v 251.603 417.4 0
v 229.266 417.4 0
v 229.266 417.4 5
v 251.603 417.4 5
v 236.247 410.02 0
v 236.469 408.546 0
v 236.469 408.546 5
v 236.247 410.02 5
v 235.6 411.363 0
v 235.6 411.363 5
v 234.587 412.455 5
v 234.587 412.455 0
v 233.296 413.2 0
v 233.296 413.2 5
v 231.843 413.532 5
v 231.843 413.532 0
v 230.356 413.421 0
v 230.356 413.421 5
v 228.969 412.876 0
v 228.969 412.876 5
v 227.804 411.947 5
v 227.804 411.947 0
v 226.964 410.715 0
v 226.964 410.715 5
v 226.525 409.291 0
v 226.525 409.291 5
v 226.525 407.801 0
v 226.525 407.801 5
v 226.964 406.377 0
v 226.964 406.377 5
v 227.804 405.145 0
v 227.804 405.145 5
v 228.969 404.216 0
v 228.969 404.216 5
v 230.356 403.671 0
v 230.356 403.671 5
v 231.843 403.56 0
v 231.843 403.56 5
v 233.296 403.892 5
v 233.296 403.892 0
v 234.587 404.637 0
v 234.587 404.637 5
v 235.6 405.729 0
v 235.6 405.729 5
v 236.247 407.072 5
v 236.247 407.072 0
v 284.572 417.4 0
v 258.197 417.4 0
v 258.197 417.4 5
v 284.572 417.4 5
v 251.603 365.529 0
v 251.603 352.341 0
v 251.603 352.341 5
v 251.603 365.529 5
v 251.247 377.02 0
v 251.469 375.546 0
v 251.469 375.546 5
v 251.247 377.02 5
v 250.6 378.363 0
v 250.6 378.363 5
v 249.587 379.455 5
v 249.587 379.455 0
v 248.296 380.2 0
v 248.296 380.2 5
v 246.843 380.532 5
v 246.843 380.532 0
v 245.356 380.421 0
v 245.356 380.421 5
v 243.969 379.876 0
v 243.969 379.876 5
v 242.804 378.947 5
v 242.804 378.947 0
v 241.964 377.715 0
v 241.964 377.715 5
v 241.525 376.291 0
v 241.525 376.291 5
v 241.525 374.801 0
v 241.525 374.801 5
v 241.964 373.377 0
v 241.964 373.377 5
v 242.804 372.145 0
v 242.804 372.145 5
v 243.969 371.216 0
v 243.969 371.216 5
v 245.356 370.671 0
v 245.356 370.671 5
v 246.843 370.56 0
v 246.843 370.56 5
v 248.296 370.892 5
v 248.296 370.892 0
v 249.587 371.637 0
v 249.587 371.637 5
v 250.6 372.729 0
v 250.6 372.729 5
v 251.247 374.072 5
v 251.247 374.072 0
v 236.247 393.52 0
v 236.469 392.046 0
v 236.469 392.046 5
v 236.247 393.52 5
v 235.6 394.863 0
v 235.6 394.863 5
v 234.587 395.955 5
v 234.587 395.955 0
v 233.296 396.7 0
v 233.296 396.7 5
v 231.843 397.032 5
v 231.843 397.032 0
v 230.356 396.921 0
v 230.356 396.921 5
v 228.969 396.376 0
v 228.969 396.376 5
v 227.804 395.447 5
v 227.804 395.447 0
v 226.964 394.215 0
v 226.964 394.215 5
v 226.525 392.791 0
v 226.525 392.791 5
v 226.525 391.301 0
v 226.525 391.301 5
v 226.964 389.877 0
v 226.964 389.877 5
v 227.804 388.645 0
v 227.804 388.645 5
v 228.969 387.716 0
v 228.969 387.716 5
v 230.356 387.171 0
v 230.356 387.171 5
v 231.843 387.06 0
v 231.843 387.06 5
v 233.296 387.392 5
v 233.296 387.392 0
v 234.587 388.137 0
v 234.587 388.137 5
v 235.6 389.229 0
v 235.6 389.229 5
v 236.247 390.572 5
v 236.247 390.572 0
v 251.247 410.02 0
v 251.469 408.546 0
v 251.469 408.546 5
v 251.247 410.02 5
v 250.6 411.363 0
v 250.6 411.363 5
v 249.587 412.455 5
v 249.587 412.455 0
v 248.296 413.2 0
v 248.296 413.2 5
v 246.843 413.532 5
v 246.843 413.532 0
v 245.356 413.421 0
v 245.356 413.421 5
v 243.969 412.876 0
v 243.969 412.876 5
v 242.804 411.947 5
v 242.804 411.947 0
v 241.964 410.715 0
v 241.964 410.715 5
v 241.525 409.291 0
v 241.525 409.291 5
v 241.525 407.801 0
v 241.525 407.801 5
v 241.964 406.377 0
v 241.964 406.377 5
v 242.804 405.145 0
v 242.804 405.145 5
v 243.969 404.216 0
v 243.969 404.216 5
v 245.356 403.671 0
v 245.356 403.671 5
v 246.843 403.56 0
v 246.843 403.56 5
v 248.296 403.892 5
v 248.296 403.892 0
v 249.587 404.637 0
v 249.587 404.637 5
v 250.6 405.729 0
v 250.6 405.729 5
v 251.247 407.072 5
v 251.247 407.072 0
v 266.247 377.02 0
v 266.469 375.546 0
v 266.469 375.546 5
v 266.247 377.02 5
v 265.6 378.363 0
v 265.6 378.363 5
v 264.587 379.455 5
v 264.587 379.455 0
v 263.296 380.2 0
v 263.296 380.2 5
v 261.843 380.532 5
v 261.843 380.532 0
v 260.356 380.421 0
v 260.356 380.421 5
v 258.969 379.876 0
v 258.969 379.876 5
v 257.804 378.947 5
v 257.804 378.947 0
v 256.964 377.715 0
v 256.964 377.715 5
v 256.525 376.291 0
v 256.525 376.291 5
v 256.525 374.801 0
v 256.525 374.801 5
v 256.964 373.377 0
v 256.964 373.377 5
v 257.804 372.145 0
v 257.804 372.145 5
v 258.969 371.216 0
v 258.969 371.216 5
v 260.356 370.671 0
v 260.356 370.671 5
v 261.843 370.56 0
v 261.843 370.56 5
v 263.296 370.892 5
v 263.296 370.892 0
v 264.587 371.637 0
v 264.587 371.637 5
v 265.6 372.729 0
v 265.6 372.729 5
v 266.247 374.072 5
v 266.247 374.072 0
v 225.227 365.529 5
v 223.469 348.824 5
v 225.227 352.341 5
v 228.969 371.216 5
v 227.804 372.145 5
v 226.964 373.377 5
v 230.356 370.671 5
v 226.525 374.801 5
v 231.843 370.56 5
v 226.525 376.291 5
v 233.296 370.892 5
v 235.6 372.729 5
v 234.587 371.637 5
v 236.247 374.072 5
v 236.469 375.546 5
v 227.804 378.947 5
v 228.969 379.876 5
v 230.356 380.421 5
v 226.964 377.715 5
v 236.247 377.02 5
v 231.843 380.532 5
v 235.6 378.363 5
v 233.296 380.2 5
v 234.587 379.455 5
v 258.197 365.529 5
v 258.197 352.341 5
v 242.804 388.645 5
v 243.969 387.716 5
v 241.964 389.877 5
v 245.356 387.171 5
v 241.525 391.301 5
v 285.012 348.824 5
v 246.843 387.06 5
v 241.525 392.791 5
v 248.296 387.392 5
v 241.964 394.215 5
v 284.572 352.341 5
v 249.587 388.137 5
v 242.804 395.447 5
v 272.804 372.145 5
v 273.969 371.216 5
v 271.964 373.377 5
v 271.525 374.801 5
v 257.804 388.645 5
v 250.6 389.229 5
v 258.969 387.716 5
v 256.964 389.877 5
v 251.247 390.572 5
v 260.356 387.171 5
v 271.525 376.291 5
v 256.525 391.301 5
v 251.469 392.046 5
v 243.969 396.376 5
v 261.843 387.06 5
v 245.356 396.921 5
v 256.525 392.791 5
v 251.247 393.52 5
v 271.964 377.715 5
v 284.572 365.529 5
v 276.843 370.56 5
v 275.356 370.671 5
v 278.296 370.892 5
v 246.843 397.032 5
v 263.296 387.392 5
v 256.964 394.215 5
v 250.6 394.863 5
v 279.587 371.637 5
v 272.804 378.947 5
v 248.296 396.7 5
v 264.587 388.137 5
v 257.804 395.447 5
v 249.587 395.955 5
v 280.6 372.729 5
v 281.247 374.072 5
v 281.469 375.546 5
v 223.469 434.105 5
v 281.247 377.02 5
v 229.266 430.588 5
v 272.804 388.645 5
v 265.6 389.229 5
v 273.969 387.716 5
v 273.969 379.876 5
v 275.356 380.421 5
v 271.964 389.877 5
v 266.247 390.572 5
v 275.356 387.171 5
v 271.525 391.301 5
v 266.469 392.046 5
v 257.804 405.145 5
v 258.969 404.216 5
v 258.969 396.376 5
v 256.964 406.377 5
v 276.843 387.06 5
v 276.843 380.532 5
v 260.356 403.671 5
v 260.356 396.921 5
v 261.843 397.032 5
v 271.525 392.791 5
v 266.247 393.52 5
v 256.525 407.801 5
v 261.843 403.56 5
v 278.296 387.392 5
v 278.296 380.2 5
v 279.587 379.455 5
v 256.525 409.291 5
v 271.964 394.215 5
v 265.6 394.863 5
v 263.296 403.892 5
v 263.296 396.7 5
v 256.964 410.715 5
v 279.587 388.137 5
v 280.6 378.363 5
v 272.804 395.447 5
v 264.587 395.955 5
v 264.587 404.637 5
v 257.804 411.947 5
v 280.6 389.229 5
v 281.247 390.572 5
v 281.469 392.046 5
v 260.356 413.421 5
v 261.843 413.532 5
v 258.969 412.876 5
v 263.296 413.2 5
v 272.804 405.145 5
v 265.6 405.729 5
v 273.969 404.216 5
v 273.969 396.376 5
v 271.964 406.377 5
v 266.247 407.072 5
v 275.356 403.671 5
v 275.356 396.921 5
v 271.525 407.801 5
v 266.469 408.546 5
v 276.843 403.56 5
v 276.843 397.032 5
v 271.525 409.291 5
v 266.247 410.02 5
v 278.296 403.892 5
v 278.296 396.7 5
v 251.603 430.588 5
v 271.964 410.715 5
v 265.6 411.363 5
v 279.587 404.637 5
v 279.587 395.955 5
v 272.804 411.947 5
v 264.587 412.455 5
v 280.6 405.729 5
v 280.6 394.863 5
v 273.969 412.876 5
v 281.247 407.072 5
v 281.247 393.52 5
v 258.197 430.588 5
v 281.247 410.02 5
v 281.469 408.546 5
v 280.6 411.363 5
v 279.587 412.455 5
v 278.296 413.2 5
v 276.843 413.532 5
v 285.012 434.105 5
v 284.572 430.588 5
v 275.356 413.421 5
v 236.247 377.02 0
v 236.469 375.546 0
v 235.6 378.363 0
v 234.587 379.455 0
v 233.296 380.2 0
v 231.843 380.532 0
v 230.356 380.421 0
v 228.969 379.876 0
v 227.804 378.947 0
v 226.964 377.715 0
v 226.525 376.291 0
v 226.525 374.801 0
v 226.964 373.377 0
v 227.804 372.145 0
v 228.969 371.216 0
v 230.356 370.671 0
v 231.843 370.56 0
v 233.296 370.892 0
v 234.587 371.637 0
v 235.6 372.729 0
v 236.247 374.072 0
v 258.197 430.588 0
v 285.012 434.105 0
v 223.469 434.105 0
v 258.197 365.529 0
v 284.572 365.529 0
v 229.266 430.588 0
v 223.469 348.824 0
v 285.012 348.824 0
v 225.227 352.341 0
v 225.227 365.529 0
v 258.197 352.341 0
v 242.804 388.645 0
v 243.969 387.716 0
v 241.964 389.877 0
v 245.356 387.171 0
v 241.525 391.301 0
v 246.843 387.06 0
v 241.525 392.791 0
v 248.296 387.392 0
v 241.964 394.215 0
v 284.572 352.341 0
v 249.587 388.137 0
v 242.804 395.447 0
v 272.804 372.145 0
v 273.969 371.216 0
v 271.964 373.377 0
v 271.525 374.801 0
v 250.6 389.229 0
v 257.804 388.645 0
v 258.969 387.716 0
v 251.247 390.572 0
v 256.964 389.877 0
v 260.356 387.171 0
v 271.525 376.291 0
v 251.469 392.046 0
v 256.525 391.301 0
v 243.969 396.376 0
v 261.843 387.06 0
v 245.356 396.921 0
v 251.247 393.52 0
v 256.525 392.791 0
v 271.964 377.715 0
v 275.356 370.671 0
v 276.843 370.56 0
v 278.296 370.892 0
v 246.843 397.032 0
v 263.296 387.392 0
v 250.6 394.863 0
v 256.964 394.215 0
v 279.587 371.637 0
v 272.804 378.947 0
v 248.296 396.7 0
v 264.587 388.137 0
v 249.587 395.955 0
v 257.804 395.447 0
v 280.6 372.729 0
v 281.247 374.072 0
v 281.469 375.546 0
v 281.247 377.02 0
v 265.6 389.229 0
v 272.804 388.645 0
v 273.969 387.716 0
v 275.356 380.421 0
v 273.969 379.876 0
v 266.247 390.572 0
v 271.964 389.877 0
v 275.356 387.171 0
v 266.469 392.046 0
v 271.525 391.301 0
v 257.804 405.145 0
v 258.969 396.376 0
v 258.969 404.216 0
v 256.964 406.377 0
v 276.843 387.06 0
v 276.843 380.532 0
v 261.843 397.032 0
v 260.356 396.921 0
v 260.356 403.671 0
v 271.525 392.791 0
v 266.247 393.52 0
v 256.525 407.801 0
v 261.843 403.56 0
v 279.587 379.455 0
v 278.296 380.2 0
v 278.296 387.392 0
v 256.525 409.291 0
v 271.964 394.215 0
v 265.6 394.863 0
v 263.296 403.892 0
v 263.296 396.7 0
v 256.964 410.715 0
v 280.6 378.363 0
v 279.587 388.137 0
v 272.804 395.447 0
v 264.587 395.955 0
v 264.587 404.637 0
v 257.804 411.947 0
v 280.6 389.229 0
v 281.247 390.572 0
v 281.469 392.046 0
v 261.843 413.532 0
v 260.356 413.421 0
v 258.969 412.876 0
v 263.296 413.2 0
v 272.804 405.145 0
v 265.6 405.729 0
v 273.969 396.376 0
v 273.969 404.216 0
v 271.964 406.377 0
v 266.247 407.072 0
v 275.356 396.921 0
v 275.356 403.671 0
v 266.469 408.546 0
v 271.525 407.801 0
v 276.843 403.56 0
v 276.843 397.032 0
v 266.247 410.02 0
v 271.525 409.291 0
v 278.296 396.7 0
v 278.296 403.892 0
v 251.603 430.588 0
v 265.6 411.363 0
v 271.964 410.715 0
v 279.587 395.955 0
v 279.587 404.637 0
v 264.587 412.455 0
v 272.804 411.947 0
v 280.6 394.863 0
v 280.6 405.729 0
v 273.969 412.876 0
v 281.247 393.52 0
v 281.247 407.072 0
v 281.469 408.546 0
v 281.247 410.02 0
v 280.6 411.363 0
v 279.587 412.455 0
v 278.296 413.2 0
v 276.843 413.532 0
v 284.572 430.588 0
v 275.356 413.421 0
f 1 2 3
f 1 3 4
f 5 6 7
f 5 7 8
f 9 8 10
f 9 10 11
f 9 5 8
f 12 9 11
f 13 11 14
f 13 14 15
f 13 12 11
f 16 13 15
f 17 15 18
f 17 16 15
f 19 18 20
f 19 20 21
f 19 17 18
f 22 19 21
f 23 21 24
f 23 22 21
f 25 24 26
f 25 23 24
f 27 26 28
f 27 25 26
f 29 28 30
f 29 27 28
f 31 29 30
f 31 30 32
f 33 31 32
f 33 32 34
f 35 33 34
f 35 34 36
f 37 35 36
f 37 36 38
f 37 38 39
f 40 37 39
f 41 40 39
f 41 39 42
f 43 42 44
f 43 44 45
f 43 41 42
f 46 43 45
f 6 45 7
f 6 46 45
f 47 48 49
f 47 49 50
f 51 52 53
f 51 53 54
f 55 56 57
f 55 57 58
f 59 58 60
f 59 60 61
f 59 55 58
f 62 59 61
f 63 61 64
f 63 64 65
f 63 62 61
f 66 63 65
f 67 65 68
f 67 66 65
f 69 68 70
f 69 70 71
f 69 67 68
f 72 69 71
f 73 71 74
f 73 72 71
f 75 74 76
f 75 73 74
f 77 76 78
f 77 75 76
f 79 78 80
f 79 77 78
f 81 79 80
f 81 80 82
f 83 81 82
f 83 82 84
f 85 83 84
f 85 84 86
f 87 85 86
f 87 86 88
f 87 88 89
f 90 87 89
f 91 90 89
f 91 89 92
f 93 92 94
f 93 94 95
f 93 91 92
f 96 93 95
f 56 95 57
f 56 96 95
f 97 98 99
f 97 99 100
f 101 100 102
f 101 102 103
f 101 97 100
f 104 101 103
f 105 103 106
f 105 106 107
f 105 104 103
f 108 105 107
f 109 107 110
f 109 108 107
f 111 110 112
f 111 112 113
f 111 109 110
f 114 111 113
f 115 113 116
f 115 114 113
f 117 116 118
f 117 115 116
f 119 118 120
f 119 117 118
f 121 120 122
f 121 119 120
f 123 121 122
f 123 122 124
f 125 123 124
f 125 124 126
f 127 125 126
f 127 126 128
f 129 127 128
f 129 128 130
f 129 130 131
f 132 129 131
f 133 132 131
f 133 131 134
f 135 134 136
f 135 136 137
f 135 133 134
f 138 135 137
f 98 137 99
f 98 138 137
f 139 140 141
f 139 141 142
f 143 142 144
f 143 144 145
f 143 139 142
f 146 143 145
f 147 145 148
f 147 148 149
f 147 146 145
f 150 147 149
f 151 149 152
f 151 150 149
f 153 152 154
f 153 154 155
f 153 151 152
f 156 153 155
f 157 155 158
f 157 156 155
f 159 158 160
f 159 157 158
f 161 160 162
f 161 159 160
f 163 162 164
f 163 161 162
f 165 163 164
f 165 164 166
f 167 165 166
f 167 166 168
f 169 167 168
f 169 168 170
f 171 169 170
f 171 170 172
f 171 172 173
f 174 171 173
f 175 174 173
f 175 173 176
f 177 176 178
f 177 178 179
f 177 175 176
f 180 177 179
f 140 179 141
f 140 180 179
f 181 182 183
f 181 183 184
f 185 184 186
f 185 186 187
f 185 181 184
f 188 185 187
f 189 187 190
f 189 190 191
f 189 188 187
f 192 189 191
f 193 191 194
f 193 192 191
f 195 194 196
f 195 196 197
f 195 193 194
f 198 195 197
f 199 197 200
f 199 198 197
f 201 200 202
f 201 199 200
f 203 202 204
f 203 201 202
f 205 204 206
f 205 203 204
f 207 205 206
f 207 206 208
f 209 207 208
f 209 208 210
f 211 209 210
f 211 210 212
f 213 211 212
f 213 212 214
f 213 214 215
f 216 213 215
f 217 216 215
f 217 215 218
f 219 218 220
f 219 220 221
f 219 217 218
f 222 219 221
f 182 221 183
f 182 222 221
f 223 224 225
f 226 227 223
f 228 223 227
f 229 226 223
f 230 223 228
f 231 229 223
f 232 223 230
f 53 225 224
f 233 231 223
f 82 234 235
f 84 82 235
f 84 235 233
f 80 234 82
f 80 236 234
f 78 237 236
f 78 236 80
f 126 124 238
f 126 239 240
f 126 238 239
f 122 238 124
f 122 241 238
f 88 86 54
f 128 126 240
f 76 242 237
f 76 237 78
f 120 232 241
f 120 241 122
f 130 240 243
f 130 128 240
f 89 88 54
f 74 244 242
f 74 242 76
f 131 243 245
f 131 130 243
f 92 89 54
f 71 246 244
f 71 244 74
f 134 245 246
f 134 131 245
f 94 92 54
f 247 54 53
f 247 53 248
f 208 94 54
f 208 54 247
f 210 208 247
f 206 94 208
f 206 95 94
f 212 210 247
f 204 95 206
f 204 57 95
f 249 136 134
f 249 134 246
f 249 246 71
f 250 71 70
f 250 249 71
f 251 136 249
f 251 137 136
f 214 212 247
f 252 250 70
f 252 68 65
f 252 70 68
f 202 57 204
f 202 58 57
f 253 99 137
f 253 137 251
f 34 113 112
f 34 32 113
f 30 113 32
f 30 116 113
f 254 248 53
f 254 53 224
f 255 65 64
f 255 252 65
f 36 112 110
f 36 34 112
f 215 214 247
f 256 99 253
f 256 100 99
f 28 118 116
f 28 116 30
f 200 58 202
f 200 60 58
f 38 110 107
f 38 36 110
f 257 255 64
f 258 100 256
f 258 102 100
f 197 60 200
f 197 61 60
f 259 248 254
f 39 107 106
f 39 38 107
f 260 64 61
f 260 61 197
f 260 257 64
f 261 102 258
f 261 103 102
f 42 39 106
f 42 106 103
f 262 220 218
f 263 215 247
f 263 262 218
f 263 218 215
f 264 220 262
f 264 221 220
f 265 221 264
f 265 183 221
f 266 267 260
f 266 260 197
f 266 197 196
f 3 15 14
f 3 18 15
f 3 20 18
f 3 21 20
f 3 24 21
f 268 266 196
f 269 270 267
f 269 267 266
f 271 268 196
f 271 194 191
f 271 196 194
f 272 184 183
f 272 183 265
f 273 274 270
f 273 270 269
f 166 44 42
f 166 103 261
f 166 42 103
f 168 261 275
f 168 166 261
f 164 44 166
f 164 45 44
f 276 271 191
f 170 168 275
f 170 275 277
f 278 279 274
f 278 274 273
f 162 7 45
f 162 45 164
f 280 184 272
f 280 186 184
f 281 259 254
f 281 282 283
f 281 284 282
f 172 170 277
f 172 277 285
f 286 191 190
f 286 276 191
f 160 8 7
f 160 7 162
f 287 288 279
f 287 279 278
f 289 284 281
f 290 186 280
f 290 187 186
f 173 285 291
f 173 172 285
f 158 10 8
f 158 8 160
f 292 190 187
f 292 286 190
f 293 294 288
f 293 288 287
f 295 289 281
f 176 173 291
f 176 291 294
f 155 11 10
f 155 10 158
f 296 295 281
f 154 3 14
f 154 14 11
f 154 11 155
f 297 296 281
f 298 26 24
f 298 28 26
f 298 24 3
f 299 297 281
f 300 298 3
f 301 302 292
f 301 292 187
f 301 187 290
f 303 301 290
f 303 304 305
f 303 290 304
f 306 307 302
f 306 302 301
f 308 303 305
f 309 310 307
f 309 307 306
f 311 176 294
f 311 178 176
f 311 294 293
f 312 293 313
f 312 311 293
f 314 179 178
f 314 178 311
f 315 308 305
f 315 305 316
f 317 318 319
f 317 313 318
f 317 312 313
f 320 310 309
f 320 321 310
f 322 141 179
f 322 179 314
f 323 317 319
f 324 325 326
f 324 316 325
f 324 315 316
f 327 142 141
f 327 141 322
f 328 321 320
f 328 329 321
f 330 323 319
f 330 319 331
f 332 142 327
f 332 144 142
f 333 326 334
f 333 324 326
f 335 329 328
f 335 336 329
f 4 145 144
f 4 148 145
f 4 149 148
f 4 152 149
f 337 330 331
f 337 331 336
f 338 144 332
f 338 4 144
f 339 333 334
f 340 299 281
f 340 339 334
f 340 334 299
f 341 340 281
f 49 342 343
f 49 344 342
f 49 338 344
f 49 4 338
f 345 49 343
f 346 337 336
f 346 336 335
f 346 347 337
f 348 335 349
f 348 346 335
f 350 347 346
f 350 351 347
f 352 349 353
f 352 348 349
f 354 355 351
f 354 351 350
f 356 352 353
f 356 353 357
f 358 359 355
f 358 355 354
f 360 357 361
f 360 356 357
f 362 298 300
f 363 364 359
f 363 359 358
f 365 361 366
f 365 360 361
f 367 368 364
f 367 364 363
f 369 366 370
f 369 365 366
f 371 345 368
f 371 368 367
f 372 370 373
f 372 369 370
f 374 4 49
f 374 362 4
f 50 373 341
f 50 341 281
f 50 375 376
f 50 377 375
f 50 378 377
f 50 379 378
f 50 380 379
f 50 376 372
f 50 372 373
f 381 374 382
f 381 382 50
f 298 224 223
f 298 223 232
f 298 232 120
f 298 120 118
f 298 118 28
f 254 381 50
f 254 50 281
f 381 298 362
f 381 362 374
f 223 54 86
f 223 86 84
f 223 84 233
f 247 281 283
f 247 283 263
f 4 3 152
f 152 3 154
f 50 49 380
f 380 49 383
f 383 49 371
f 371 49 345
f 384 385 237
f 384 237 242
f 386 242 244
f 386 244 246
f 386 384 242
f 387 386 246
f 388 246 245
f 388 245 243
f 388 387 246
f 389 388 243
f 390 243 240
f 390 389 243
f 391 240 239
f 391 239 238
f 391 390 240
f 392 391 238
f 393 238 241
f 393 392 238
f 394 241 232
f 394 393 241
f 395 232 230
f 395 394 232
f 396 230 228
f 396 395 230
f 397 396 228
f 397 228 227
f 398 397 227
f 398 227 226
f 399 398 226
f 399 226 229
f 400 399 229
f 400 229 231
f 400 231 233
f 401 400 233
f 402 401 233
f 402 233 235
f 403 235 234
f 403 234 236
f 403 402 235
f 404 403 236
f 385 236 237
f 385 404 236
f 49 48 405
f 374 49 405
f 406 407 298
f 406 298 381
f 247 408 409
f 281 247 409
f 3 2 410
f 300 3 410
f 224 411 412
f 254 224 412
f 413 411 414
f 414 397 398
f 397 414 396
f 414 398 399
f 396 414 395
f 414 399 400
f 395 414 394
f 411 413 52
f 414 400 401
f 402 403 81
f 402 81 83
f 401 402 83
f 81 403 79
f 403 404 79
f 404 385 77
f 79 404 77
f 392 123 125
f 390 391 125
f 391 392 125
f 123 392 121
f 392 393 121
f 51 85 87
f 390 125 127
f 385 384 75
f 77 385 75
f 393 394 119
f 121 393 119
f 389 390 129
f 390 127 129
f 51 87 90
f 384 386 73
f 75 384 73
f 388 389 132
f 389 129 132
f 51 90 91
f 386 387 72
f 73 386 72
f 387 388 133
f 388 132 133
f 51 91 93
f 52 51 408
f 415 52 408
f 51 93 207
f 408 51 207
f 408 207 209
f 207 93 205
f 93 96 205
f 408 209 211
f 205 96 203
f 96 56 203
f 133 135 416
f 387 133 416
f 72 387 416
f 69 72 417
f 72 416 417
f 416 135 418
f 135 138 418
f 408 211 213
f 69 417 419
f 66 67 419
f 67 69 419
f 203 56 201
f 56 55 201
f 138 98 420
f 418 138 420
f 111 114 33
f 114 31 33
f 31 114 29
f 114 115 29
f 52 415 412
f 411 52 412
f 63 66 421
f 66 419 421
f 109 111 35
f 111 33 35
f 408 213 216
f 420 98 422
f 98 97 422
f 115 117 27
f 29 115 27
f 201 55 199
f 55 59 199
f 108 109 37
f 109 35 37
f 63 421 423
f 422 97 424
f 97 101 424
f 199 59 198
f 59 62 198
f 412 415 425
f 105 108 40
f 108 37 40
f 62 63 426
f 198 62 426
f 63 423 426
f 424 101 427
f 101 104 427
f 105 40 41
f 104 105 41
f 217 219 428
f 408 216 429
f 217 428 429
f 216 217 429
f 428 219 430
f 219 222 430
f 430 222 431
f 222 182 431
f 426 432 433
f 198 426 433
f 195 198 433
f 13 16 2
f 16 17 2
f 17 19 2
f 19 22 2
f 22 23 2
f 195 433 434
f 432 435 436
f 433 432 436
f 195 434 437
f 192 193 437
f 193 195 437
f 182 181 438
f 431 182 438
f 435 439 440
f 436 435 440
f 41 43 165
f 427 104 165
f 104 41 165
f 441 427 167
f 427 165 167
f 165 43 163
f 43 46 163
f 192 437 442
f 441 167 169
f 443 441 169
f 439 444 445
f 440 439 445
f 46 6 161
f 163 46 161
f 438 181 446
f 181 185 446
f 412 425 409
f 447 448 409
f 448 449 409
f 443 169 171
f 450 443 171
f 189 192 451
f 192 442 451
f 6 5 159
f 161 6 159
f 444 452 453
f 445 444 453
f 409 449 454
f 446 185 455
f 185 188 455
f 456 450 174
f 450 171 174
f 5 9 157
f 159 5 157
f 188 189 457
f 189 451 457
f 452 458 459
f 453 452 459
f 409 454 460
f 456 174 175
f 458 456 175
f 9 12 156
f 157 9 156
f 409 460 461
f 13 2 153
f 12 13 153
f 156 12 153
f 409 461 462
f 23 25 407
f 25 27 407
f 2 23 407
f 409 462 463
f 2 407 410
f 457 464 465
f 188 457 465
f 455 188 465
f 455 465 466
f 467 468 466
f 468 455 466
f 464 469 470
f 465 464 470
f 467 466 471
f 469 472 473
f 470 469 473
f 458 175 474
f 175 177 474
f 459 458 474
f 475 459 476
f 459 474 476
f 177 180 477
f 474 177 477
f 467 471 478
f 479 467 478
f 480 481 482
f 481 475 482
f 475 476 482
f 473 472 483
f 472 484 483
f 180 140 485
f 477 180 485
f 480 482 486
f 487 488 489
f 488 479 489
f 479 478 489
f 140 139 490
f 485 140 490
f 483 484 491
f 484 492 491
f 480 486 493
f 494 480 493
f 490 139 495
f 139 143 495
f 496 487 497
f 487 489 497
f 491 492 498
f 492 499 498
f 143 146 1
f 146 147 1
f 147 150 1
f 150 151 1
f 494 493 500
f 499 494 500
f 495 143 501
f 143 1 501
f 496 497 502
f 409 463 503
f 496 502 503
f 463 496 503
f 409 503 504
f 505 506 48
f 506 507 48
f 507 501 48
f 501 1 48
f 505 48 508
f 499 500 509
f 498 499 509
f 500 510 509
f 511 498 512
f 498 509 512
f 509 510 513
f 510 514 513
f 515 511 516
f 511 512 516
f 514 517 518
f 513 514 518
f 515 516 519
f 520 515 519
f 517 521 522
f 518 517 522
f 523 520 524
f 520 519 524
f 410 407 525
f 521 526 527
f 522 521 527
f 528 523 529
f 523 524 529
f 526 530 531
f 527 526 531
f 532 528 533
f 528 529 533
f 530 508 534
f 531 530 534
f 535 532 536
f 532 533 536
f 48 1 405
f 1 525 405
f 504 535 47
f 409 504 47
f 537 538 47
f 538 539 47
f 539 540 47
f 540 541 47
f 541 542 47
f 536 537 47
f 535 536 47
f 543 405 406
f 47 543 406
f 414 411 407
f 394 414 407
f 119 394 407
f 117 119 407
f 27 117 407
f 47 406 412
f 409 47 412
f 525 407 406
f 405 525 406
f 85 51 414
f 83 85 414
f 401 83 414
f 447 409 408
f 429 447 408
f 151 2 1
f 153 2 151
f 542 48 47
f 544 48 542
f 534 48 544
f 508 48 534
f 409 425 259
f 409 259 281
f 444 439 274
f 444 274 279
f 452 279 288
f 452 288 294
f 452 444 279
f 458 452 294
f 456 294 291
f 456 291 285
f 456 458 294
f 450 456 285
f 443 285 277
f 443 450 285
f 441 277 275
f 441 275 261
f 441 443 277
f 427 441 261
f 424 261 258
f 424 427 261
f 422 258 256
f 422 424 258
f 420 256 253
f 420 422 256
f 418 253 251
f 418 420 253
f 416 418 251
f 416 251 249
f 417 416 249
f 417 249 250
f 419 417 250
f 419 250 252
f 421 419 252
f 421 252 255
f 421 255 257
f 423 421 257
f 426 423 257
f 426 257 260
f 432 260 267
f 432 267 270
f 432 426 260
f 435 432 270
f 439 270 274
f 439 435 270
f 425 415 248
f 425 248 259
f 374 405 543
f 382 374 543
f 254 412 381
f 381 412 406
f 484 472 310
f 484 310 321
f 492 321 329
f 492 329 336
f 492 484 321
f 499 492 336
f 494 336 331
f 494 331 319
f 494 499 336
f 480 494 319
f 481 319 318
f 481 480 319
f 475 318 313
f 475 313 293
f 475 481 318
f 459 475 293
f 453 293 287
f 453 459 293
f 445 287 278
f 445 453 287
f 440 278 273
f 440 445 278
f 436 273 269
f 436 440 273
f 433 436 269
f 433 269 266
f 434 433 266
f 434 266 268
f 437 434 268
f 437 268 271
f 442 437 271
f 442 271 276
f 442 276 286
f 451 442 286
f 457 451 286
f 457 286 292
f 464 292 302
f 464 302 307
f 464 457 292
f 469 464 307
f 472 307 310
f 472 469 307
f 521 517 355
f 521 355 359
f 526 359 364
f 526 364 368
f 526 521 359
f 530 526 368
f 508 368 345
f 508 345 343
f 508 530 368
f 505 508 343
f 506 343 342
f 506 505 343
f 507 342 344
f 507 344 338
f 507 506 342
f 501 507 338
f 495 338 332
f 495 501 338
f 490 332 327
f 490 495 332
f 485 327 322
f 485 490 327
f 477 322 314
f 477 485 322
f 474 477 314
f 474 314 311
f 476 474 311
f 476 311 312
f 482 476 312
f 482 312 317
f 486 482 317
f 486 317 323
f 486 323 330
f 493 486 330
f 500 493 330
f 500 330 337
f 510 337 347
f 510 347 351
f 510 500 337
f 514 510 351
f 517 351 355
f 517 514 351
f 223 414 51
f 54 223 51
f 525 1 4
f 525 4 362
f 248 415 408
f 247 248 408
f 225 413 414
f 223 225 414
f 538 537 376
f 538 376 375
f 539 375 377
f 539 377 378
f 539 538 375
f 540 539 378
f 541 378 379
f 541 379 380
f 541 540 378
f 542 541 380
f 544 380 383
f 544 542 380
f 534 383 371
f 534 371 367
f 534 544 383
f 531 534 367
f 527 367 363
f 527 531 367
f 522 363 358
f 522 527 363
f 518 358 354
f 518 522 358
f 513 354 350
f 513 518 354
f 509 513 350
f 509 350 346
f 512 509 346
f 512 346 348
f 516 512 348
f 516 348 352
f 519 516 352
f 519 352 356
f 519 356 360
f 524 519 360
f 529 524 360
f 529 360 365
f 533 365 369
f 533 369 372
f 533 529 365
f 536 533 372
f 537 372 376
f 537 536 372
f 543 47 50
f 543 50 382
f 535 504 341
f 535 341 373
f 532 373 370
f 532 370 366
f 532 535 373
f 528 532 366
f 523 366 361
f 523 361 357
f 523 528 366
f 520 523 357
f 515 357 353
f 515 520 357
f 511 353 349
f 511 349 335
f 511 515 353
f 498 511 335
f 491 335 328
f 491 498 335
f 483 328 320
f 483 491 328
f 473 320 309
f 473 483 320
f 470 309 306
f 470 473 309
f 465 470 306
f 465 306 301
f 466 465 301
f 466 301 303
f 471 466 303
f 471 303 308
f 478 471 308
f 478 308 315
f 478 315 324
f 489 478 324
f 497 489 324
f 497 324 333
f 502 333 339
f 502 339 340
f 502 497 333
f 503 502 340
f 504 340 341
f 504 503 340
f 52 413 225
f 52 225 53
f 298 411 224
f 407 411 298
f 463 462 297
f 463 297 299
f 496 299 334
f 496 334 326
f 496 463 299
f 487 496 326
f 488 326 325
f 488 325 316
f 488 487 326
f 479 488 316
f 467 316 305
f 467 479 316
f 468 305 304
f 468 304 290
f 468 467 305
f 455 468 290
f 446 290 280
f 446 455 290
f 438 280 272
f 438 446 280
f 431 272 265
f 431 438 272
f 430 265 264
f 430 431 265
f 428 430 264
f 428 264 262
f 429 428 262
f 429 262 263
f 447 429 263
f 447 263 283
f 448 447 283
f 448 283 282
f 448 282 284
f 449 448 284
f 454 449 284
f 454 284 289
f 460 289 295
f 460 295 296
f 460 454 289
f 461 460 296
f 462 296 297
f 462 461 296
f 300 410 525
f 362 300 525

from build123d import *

# Parameters (mm, degrees)
SKETCH1_W           = 61.542579433
SKETCH1_H           = 85.2804315
SKETCH1_R           = 5
SKETCH1_W_2         = 22.337231555
SKETCH1_H_2         = 13.187695593
SKETCH1_W_3         = 26.375391186
BOSS_EXTRUDE1_DEPTH = 5


with BuildPart() as part:
    # Sketch1 → Boss-Extrude1 (new body)
    with BuildSketch(Plane.XY):
        with Locations((254.240343952, 391.464524612)):
            Rectangle(SKETCH1_W, SKETCH1_H)
        with Locations((231.469054236, 408.546029818)):
            Circle(SKETCH1_R, mode=Mode.SUBTRACT)
        with Locations((246.469054236, 408.546029818)):
            Circle(SKETCH1_R, mode=Mode.SUBTRACT)
        with Locations((261.469054236, 408.546029818)):
            Circle(SKETCH1_R, mode=Mode.SUBTRACT)
        with Locations((276.469054236, 408.546029818)):
            Circle(SKETCH1_R, mode=Mode.SUBTRACT)
        with Locations((231.469054236, 392.046029818)):
            Circle(SKETCH1_R, mode=Mode.SUBTRACT)
        with Locations((246.469054236, 392.046029818)):
            Circle(SKETCH1_R, mode=Mode.SUBTRACT)
        with Locations((261.469054236, 392.046029818)):
            Circle(SKETCH1_R, mode=Mode.SUBTRACT)
        with Locations((276.469054236, 392.046029818)):
            Circle(SKETCH1_R, mode=Mode.SUBTRACT)
        with Locations((231.469054236, 375.546029818)):
            Circle(SKETCH1_R, mode=Mode.SUBTRACT)
        with Locations((246.469054236, 375.546029818)):
            Circle(SKETCH1_R, mode=Mode.SUBTRACT)
        with Locations((261.469054236, 375.546029818)):
            Circle(SKETCH1_R, mode=Mode.SUBTRACT)
        with Locations((276.469054236, 375.546029818)):
            Circle(SKETCH1_R, mode=Mode.SUBTRACT)
        with Locations((240.434189057, 423.994173741)):
            Rectangle(SKETCH1_W_2, SKETCH1_H_2, mode=Mode.SUBTRACT)
        with Locations((271.384348223, 423.994173741)):
            Rectangle(SKETCH1_W_3, SKETCH1_H_2, mode=Mode.SUBTRACT)
        with Locations((238.415109241, 358.934875483)):
            Rectangle(SKETCH1_W_3, SKETCH1_H_2, mode=Mode.SUBTRACT)
        with Locations((271.384348223, 358.934875483)):
            Rectangle(SKETCH1_W_3, SKETCH1_H_2, mode=Mode.SUBTRACT)
    extrude(amount=BOSS_EXTRUDE1_DEPTH)


solid = part.part
